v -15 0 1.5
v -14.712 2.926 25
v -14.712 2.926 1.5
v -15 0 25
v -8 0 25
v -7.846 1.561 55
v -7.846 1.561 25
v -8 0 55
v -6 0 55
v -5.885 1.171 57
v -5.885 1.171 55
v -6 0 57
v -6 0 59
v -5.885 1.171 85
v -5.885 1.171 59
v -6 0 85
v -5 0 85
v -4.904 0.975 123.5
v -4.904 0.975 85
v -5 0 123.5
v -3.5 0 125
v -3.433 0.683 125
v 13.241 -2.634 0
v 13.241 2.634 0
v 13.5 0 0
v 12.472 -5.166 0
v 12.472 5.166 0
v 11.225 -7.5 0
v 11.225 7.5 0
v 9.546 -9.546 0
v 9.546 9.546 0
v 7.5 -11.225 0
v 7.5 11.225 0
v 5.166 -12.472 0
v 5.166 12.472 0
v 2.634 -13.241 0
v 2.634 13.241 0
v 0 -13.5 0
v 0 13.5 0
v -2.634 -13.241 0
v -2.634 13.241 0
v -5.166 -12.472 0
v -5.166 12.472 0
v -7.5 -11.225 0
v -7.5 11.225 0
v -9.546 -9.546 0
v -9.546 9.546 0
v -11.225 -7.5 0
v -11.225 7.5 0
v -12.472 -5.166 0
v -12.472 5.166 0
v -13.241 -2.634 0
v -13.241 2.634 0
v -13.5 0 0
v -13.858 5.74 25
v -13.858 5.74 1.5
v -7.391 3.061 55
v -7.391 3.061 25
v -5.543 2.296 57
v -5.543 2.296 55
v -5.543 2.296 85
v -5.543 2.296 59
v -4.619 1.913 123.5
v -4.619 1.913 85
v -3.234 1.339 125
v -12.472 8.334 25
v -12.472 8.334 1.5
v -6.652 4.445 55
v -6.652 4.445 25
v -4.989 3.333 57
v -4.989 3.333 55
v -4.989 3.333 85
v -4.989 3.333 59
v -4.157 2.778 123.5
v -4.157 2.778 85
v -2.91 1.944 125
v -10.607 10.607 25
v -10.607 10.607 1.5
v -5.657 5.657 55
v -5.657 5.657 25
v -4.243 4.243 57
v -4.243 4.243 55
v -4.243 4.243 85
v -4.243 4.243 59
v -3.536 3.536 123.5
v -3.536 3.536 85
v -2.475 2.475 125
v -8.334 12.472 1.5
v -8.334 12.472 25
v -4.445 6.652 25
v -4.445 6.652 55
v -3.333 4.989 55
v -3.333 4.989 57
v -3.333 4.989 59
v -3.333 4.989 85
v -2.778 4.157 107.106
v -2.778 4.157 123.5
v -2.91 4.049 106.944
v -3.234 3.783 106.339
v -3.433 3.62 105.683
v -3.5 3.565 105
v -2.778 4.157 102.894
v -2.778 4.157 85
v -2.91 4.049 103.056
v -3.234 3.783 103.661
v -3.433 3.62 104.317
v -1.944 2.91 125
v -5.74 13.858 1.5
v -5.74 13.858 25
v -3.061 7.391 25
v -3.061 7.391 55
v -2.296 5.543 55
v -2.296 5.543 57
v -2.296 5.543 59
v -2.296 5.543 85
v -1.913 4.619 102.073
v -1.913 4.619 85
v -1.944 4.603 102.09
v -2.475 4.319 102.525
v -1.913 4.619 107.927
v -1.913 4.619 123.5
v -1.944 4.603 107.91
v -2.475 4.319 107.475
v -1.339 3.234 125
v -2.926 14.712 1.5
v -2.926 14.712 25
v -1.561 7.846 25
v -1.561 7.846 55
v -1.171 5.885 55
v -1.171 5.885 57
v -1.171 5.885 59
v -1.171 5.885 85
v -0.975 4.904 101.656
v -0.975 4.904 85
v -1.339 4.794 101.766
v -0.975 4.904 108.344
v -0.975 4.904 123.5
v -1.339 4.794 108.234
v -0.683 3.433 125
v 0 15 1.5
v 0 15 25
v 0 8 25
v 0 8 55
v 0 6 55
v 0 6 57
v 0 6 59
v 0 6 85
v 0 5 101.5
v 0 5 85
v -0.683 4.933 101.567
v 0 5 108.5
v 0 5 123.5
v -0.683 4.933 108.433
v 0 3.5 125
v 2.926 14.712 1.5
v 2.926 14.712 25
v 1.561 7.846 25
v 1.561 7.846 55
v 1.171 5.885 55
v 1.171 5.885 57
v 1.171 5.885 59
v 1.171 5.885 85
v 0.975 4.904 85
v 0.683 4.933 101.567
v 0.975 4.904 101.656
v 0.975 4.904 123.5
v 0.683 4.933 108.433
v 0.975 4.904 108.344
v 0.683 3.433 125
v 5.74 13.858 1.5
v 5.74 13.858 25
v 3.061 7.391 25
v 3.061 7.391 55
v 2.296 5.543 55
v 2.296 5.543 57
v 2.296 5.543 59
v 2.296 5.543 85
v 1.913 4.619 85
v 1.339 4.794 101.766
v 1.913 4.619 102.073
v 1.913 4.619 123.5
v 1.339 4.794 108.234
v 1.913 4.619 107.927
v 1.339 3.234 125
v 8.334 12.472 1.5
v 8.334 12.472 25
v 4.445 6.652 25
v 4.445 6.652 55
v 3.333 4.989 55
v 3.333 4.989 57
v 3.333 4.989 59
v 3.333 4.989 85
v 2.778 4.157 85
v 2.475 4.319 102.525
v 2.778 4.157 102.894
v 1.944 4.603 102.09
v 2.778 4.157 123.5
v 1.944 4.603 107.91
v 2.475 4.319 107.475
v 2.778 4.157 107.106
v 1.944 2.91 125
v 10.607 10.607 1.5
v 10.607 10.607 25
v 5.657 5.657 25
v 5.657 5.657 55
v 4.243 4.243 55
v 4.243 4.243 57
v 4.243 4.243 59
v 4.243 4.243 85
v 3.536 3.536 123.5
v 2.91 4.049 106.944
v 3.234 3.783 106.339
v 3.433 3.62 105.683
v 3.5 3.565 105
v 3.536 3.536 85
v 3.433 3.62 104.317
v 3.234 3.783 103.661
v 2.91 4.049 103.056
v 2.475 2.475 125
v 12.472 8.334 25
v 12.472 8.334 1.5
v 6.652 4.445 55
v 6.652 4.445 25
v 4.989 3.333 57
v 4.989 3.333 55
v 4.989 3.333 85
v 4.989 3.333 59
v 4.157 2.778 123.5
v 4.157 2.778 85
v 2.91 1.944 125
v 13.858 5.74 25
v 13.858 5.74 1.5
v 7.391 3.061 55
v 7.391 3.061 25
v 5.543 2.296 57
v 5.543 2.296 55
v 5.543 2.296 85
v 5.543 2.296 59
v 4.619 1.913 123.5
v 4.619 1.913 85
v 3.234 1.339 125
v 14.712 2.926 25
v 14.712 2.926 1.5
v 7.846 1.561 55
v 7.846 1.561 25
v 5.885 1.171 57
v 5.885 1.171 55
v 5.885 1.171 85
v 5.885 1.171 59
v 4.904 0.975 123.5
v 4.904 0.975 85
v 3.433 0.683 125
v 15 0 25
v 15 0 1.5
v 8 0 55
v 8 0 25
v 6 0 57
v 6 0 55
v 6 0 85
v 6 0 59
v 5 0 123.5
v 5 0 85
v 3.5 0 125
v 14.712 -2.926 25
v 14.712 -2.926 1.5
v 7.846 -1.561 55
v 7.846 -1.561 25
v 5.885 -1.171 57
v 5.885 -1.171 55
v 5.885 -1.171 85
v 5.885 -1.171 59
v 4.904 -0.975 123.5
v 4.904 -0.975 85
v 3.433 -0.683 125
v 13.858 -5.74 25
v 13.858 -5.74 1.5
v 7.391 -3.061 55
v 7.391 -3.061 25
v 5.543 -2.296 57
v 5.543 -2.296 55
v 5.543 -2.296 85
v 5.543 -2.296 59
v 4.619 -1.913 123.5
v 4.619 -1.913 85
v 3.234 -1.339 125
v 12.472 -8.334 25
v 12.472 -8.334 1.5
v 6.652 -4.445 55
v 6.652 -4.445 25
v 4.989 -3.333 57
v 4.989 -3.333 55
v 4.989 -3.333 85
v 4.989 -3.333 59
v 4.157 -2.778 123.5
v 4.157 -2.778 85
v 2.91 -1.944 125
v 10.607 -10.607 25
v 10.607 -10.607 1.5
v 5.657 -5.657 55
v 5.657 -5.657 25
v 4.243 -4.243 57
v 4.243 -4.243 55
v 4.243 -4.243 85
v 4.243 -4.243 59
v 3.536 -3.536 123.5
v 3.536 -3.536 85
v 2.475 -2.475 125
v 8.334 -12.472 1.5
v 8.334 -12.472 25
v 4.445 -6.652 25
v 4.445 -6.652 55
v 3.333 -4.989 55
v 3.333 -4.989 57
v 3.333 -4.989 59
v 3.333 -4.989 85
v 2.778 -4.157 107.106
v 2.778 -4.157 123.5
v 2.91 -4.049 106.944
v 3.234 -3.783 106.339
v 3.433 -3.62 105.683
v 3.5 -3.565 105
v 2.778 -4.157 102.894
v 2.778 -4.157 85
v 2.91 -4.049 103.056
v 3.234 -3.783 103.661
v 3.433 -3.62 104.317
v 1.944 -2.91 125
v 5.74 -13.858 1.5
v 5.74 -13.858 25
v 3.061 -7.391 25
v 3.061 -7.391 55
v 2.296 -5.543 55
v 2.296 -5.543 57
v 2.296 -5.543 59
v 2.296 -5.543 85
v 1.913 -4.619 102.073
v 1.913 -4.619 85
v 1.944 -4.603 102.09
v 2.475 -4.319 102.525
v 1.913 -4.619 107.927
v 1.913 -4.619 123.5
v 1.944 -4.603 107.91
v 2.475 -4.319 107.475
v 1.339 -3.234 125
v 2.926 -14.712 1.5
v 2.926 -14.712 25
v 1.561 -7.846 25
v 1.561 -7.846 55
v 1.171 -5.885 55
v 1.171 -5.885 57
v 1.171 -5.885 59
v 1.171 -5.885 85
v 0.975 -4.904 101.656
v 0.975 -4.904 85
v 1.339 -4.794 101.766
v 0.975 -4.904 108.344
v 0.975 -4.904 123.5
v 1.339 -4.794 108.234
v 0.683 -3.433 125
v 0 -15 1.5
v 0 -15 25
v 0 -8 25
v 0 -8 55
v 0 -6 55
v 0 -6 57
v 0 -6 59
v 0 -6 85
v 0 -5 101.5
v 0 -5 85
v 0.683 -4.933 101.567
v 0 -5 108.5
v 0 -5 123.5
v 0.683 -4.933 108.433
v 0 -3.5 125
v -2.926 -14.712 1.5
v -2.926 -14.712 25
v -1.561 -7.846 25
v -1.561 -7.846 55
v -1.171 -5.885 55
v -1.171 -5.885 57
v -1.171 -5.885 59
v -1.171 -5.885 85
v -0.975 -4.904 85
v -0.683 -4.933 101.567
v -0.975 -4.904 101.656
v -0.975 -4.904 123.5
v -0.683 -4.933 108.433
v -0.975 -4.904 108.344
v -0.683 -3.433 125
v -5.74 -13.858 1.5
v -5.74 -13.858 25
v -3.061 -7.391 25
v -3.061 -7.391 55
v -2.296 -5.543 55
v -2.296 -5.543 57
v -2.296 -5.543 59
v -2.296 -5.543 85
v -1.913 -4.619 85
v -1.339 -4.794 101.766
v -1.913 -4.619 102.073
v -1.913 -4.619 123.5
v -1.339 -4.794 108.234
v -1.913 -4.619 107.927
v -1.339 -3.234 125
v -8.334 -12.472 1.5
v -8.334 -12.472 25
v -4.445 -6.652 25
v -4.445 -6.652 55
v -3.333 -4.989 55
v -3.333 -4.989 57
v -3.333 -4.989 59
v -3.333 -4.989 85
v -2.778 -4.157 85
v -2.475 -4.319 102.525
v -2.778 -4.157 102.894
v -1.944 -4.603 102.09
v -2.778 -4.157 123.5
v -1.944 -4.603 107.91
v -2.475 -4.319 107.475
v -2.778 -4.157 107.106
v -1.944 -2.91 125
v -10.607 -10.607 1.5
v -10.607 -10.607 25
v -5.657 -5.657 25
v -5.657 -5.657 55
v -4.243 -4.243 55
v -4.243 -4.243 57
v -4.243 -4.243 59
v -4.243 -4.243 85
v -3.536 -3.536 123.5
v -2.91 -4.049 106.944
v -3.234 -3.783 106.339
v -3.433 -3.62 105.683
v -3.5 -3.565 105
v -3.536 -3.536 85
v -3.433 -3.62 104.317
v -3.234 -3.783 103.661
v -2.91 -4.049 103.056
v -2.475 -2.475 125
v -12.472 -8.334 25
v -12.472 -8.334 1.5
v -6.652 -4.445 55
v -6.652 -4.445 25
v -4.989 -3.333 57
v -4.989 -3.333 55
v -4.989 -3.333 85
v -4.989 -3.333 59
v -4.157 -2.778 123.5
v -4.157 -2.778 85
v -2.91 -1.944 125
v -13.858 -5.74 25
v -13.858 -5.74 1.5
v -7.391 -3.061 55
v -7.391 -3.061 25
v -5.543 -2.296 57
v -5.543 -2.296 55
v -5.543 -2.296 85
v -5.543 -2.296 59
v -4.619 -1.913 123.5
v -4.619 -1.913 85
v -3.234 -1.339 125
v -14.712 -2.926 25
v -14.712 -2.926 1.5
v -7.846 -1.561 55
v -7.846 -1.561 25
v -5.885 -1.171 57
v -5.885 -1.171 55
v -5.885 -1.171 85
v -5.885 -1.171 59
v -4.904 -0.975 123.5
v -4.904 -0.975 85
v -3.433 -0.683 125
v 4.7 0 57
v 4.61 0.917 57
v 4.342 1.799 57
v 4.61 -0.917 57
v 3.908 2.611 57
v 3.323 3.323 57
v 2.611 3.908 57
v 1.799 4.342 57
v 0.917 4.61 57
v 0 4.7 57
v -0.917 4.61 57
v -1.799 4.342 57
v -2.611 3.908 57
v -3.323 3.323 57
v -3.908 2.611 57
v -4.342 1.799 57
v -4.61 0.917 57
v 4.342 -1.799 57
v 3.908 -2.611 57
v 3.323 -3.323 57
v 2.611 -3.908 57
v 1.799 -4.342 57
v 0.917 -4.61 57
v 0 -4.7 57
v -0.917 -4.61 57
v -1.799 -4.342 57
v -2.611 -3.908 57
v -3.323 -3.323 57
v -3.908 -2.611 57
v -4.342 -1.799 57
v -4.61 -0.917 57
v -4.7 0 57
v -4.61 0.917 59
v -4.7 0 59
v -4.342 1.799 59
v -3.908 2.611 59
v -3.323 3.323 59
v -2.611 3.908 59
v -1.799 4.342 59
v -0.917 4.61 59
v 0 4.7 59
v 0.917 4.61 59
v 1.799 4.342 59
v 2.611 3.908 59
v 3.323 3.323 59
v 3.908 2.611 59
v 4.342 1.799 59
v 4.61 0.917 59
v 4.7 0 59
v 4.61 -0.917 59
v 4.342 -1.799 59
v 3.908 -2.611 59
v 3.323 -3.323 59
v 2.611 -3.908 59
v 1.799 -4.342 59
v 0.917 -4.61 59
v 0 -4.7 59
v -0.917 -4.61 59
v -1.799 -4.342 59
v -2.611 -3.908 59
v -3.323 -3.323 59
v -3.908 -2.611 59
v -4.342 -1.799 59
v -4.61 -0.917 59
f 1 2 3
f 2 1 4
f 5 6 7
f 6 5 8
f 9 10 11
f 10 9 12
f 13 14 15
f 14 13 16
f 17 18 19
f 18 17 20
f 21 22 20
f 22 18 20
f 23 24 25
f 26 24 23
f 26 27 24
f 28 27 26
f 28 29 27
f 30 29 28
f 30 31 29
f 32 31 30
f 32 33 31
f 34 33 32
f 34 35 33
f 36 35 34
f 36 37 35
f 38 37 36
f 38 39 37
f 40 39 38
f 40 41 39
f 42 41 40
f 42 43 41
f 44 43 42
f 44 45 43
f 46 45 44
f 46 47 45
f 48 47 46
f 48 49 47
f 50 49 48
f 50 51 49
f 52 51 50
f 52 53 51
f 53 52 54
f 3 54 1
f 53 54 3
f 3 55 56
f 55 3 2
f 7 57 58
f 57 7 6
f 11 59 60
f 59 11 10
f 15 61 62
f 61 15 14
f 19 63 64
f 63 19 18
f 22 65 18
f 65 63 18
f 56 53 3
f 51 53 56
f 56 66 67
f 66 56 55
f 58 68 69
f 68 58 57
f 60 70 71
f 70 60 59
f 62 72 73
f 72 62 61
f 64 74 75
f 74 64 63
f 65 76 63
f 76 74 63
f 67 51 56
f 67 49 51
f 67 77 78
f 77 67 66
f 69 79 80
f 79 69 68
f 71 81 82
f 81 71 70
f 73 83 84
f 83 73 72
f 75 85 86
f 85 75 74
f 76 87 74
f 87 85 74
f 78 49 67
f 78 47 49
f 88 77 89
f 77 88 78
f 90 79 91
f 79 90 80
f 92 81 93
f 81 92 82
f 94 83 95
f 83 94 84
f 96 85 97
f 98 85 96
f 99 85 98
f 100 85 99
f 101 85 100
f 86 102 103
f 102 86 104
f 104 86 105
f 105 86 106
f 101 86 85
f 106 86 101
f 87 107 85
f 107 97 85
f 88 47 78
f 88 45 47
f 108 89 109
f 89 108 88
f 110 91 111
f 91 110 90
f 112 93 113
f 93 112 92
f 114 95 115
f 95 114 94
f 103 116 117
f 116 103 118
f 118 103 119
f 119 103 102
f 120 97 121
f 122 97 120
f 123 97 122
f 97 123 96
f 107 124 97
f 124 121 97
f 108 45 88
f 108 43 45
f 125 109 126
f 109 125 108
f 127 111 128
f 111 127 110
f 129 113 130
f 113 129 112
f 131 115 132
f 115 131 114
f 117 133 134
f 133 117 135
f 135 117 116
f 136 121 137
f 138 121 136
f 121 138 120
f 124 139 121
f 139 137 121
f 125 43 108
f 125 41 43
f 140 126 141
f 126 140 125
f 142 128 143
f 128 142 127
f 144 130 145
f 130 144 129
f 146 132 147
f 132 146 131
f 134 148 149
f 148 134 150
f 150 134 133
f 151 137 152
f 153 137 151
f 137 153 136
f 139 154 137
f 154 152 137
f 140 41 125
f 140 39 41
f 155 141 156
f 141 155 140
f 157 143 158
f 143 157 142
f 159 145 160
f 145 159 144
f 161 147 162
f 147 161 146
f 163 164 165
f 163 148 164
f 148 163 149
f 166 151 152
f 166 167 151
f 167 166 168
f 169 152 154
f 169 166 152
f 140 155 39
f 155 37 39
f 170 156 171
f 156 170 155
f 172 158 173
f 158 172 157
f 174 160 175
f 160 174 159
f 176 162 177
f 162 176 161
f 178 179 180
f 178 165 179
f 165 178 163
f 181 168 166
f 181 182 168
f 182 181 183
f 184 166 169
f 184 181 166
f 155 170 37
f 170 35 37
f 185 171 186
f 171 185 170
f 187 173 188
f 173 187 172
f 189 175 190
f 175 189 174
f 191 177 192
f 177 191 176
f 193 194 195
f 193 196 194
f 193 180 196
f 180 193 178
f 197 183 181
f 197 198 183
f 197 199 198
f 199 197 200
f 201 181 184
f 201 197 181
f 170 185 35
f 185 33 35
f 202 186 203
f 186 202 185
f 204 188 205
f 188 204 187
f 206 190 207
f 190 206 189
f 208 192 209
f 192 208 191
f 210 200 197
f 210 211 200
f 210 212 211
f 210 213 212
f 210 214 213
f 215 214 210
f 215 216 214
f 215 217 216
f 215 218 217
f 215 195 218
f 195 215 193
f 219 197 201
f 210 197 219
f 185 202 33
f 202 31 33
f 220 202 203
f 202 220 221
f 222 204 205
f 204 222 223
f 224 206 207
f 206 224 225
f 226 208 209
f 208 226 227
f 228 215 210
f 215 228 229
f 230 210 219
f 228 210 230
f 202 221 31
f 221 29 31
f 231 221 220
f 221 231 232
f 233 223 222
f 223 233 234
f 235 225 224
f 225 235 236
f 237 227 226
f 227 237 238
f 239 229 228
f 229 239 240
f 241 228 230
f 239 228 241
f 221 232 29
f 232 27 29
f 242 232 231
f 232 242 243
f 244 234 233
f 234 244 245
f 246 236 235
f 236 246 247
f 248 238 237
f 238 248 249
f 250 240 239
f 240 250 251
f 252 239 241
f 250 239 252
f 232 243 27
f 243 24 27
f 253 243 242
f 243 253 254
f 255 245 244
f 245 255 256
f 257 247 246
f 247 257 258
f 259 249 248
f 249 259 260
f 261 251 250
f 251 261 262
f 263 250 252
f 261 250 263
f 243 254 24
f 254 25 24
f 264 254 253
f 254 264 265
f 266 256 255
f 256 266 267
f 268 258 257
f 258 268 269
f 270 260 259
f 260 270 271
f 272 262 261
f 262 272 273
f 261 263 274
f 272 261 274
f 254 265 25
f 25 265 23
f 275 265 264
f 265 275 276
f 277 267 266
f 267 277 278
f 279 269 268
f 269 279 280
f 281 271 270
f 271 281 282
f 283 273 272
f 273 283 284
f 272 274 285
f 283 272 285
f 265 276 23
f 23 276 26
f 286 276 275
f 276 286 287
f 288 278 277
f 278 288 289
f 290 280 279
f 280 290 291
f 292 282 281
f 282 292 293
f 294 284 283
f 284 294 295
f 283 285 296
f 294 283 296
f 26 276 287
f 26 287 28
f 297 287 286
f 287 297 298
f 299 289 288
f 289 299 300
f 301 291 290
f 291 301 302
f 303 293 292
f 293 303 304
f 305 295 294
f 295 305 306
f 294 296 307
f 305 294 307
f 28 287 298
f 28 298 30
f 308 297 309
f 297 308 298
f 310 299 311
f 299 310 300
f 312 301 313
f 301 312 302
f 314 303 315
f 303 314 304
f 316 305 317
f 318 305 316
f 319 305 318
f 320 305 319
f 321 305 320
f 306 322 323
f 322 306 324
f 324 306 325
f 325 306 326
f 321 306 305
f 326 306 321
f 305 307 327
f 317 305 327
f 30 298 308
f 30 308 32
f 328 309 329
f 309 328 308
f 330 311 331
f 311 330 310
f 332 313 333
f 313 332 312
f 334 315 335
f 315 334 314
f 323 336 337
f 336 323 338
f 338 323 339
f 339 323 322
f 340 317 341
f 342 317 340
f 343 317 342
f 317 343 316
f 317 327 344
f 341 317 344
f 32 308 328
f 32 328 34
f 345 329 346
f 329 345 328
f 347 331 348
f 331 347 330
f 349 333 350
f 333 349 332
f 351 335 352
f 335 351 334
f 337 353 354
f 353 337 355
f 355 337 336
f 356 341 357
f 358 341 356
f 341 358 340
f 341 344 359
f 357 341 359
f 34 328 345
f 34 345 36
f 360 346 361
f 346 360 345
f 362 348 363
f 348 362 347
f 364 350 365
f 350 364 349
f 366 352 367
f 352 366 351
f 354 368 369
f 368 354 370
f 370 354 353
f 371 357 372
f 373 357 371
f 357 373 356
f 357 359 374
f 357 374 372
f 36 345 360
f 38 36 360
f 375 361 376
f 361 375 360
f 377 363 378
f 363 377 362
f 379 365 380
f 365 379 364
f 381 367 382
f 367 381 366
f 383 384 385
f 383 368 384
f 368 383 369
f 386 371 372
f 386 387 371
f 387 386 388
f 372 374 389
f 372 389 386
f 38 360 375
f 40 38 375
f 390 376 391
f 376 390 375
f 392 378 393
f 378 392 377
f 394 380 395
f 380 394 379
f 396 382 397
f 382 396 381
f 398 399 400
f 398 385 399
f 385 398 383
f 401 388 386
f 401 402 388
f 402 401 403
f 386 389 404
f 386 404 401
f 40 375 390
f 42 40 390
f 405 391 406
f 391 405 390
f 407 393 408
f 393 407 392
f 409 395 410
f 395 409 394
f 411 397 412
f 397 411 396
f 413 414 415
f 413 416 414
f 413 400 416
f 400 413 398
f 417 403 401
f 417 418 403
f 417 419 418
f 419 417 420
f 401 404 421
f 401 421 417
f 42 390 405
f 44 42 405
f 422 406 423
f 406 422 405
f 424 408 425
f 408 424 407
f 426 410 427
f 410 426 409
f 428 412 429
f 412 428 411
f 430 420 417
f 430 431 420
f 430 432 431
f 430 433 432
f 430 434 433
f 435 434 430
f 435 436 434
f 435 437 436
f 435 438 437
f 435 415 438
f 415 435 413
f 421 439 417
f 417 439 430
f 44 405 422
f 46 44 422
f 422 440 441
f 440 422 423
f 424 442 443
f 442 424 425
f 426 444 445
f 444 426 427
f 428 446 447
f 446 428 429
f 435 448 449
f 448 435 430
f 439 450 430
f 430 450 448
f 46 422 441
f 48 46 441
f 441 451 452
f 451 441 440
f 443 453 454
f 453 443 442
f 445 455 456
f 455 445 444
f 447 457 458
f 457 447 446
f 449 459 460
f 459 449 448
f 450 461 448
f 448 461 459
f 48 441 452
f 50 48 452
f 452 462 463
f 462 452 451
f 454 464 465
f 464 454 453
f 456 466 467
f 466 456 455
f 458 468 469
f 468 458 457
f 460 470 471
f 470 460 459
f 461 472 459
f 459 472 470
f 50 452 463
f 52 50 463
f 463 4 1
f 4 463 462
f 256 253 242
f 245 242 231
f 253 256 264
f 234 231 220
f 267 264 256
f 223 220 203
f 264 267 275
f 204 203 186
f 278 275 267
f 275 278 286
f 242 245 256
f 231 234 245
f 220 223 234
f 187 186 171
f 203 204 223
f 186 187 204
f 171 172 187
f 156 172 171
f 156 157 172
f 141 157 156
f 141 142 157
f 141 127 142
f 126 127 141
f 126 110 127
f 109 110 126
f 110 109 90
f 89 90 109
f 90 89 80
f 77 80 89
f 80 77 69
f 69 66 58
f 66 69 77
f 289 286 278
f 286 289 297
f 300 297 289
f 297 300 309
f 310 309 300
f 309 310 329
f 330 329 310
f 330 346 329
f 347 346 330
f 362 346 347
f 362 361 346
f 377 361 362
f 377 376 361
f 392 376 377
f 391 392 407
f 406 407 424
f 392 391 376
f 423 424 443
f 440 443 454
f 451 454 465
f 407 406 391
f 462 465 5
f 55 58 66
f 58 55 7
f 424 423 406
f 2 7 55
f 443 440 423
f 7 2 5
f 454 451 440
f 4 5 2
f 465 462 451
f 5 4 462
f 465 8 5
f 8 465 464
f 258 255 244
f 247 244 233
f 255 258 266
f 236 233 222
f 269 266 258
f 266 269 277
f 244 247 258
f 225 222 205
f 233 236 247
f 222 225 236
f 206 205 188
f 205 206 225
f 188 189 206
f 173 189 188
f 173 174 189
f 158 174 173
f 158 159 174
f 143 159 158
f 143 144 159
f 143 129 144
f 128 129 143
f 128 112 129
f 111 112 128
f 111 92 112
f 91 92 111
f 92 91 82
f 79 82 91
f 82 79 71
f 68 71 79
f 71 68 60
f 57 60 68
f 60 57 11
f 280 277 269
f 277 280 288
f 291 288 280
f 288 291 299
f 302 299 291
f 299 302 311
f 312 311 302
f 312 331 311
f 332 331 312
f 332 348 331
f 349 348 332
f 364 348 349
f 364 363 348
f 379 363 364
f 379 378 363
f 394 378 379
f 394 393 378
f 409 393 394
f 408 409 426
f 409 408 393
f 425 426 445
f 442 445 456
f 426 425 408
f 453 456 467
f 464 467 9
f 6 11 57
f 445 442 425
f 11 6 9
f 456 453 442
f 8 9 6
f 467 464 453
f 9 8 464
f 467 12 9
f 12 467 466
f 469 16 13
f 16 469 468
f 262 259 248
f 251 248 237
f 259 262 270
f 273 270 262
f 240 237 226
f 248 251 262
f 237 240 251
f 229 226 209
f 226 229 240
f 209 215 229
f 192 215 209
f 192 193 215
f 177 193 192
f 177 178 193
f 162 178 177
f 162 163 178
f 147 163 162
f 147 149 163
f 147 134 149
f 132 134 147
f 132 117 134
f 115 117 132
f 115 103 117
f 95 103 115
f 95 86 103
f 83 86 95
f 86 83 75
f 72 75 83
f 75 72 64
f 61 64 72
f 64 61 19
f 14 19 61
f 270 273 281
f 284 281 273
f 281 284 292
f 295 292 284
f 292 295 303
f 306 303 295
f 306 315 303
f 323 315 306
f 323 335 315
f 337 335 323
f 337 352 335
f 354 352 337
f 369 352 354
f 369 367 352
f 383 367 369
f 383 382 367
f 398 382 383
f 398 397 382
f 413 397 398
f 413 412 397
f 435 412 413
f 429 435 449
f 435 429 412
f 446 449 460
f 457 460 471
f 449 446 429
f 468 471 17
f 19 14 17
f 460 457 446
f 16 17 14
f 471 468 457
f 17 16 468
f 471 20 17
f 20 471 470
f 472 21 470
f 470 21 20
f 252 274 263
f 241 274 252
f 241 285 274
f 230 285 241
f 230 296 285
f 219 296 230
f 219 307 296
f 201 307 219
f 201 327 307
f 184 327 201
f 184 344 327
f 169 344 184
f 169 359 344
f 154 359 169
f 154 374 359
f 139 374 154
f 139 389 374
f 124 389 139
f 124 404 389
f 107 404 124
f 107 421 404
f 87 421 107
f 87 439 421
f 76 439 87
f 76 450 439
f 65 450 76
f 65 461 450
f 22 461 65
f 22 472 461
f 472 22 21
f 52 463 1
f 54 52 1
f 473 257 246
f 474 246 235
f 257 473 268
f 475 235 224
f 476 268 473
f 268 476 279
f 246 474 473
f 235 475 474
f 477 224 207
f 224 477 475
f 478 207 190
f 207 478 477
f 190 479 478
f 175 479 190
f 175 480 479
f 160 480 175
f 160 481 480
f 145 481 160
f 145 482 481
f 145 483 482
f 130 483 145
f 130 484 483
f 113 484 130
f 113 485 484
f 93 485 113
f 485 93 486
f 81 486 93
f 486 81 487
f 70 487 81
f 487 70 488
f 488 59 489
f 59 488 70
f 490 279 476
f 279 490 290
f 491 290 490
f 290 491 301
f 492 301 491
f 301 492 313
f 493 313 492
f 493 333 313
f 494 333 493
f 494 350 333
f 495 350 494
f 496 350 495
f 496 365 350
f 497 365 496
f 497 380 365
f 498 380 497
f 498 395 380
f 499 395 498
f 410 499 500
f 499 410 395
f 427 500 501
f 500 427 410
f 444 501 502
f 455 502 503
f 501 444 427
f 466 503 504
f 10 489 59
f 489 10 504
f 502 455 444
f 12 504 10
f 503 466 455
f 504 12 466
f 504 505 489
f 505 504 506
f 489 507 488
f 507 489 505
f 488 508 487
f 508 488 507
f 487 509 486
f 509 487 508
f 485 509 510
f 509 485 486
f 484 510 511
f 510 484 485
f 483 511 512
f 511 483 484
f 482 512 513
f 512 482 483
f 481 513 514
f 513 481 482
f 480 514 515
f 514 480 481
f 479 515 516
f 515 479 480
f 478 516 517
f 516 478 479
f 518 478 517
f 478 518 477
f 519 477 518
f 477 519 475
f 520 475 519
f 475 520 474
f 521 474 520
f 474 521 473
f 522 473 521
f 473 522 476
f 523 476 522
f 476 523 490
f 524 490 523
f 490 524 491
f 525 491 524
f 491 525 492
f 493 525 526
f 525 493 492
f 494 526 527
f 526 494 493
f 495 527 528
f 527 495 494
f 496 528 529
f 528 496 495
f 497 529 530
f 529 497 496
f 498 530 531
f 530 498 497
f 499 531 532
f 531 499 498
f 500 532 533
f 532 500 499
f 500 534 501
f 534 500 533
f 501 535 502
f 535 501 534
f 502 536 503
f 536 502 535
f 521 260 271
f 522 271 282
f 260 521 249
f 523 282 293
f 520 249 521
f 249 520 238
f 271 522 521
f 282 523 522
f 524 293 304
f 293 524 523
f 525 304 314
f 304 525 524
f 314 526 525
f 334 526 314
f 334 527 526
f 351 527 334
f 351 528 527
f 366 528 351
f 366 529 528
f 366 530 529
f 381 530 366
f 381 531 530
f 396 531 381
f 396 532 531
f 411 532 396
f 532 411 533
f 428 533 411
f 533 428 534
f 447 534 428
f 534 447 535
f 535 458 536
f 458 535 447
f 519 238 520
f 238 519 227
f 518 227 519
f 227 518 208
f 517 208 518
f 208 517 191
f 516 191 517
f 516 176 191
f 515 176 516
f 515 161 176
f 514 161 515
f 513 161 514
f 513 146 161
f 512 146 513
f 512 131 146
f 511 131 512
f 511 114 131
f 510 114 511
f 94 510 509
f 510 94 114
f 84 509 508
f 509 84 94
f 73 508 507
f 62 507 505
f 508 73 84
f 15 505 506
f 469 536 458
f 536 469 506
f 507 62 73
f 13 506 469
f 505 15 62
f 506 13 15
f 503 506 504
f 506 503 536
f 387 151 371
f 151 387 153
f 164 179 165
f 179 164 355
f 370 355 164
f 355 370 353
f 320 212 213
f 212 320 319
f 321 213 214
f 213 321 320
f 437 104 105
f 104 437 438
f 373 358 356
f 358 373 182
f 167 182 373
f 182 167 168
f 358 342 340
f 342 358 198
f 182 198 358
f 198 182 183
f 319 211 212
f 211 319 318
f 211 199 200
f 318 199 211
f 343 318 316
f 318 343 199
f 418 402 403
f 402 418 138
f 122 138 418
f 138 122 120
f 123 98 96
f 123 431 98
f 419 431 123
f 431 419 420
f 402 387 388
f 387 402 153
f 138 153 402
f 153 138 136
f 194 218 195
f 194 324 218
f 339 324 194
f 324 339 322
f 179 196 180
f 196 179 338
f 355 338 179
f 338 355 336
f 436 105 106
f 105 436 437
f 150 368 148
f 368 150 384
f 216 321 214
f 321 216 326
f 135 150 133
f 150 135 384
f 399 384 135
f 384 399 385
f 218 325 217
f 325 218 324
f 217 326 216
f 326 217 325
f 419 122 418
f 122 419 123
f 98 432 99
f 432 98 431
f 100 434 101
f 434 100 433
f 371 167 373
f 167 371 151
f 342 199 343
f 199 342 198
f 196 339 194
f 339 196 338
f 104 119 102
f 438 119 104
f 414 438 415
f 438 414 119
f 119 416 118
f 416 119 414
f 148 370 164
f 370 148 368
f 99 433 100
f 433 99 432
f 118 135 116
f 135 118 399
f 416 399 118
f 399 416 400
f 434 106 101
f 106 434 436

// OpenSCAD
$fn = 32;

// ----------------------------------------------------------------------
// Stepped shaft: diameters 30, 16, 12, 10 mm, 125 mm long
// ----------------------------------------------------------------------

// --- parameters (mm) ---
d1 = 30;                  // step 1 diameter
len1 = 25;                // step 1 length
d2 = 16;                  // step 2 diameter
len2 = 30;                // step 2 length
d3 = 12;                  // step 3 diameter
len3 = 30;                // step 3 length
d4 = 10;                  // step 4 diameter
len4 = 40;                // step 4 length
total = 125;              // overall length
chamfer = 1.5;            // end chamfer
groove_r = 6;             // groove radius
groove_z = 57;            // groove position from the end
groove_w = 2;             // groove width
groove_d = 1.3;           // groove depth
key_w = 8;                // keyway width
key_d = 4;                // keyway depth
key_len = 19;             // keyway length
key_z = 103;              // keyway start along the shaft
cross_d = 7;              // cross pin hole
cross_z = 105;            // cross hole position

/* closed turning profile: x is the radius, y is the length */
profile = [[0, 0], [15 - chamfer, 0], [15, chamfer], [15, 25], [8, 25], [8, 55], [6, 55], [6, 85], [5, 85], [5, 123.5], [3.5, 125], [0, 125]];

difference() {
  rotate_extrude() polygon(profile);
  /* circlip groove just behind the shoulder */
  rotate_extrude() translate([groove_r - groove_d, groove_z]) square([groove_d + 1, groove_w]);
  /* keyway milled into the top of the largest step */
  translate([d1 / 2 - key_d, -key_w / 2, key_z]) cube([key_d + 1, key_w, key_len]);
  /* cross pin hole through the small step */
  translate([0, 0, cross_z]) rotate([90, 0, 0]) cylinder(h = d4 + 4, d = cross_d, center = true);
}
